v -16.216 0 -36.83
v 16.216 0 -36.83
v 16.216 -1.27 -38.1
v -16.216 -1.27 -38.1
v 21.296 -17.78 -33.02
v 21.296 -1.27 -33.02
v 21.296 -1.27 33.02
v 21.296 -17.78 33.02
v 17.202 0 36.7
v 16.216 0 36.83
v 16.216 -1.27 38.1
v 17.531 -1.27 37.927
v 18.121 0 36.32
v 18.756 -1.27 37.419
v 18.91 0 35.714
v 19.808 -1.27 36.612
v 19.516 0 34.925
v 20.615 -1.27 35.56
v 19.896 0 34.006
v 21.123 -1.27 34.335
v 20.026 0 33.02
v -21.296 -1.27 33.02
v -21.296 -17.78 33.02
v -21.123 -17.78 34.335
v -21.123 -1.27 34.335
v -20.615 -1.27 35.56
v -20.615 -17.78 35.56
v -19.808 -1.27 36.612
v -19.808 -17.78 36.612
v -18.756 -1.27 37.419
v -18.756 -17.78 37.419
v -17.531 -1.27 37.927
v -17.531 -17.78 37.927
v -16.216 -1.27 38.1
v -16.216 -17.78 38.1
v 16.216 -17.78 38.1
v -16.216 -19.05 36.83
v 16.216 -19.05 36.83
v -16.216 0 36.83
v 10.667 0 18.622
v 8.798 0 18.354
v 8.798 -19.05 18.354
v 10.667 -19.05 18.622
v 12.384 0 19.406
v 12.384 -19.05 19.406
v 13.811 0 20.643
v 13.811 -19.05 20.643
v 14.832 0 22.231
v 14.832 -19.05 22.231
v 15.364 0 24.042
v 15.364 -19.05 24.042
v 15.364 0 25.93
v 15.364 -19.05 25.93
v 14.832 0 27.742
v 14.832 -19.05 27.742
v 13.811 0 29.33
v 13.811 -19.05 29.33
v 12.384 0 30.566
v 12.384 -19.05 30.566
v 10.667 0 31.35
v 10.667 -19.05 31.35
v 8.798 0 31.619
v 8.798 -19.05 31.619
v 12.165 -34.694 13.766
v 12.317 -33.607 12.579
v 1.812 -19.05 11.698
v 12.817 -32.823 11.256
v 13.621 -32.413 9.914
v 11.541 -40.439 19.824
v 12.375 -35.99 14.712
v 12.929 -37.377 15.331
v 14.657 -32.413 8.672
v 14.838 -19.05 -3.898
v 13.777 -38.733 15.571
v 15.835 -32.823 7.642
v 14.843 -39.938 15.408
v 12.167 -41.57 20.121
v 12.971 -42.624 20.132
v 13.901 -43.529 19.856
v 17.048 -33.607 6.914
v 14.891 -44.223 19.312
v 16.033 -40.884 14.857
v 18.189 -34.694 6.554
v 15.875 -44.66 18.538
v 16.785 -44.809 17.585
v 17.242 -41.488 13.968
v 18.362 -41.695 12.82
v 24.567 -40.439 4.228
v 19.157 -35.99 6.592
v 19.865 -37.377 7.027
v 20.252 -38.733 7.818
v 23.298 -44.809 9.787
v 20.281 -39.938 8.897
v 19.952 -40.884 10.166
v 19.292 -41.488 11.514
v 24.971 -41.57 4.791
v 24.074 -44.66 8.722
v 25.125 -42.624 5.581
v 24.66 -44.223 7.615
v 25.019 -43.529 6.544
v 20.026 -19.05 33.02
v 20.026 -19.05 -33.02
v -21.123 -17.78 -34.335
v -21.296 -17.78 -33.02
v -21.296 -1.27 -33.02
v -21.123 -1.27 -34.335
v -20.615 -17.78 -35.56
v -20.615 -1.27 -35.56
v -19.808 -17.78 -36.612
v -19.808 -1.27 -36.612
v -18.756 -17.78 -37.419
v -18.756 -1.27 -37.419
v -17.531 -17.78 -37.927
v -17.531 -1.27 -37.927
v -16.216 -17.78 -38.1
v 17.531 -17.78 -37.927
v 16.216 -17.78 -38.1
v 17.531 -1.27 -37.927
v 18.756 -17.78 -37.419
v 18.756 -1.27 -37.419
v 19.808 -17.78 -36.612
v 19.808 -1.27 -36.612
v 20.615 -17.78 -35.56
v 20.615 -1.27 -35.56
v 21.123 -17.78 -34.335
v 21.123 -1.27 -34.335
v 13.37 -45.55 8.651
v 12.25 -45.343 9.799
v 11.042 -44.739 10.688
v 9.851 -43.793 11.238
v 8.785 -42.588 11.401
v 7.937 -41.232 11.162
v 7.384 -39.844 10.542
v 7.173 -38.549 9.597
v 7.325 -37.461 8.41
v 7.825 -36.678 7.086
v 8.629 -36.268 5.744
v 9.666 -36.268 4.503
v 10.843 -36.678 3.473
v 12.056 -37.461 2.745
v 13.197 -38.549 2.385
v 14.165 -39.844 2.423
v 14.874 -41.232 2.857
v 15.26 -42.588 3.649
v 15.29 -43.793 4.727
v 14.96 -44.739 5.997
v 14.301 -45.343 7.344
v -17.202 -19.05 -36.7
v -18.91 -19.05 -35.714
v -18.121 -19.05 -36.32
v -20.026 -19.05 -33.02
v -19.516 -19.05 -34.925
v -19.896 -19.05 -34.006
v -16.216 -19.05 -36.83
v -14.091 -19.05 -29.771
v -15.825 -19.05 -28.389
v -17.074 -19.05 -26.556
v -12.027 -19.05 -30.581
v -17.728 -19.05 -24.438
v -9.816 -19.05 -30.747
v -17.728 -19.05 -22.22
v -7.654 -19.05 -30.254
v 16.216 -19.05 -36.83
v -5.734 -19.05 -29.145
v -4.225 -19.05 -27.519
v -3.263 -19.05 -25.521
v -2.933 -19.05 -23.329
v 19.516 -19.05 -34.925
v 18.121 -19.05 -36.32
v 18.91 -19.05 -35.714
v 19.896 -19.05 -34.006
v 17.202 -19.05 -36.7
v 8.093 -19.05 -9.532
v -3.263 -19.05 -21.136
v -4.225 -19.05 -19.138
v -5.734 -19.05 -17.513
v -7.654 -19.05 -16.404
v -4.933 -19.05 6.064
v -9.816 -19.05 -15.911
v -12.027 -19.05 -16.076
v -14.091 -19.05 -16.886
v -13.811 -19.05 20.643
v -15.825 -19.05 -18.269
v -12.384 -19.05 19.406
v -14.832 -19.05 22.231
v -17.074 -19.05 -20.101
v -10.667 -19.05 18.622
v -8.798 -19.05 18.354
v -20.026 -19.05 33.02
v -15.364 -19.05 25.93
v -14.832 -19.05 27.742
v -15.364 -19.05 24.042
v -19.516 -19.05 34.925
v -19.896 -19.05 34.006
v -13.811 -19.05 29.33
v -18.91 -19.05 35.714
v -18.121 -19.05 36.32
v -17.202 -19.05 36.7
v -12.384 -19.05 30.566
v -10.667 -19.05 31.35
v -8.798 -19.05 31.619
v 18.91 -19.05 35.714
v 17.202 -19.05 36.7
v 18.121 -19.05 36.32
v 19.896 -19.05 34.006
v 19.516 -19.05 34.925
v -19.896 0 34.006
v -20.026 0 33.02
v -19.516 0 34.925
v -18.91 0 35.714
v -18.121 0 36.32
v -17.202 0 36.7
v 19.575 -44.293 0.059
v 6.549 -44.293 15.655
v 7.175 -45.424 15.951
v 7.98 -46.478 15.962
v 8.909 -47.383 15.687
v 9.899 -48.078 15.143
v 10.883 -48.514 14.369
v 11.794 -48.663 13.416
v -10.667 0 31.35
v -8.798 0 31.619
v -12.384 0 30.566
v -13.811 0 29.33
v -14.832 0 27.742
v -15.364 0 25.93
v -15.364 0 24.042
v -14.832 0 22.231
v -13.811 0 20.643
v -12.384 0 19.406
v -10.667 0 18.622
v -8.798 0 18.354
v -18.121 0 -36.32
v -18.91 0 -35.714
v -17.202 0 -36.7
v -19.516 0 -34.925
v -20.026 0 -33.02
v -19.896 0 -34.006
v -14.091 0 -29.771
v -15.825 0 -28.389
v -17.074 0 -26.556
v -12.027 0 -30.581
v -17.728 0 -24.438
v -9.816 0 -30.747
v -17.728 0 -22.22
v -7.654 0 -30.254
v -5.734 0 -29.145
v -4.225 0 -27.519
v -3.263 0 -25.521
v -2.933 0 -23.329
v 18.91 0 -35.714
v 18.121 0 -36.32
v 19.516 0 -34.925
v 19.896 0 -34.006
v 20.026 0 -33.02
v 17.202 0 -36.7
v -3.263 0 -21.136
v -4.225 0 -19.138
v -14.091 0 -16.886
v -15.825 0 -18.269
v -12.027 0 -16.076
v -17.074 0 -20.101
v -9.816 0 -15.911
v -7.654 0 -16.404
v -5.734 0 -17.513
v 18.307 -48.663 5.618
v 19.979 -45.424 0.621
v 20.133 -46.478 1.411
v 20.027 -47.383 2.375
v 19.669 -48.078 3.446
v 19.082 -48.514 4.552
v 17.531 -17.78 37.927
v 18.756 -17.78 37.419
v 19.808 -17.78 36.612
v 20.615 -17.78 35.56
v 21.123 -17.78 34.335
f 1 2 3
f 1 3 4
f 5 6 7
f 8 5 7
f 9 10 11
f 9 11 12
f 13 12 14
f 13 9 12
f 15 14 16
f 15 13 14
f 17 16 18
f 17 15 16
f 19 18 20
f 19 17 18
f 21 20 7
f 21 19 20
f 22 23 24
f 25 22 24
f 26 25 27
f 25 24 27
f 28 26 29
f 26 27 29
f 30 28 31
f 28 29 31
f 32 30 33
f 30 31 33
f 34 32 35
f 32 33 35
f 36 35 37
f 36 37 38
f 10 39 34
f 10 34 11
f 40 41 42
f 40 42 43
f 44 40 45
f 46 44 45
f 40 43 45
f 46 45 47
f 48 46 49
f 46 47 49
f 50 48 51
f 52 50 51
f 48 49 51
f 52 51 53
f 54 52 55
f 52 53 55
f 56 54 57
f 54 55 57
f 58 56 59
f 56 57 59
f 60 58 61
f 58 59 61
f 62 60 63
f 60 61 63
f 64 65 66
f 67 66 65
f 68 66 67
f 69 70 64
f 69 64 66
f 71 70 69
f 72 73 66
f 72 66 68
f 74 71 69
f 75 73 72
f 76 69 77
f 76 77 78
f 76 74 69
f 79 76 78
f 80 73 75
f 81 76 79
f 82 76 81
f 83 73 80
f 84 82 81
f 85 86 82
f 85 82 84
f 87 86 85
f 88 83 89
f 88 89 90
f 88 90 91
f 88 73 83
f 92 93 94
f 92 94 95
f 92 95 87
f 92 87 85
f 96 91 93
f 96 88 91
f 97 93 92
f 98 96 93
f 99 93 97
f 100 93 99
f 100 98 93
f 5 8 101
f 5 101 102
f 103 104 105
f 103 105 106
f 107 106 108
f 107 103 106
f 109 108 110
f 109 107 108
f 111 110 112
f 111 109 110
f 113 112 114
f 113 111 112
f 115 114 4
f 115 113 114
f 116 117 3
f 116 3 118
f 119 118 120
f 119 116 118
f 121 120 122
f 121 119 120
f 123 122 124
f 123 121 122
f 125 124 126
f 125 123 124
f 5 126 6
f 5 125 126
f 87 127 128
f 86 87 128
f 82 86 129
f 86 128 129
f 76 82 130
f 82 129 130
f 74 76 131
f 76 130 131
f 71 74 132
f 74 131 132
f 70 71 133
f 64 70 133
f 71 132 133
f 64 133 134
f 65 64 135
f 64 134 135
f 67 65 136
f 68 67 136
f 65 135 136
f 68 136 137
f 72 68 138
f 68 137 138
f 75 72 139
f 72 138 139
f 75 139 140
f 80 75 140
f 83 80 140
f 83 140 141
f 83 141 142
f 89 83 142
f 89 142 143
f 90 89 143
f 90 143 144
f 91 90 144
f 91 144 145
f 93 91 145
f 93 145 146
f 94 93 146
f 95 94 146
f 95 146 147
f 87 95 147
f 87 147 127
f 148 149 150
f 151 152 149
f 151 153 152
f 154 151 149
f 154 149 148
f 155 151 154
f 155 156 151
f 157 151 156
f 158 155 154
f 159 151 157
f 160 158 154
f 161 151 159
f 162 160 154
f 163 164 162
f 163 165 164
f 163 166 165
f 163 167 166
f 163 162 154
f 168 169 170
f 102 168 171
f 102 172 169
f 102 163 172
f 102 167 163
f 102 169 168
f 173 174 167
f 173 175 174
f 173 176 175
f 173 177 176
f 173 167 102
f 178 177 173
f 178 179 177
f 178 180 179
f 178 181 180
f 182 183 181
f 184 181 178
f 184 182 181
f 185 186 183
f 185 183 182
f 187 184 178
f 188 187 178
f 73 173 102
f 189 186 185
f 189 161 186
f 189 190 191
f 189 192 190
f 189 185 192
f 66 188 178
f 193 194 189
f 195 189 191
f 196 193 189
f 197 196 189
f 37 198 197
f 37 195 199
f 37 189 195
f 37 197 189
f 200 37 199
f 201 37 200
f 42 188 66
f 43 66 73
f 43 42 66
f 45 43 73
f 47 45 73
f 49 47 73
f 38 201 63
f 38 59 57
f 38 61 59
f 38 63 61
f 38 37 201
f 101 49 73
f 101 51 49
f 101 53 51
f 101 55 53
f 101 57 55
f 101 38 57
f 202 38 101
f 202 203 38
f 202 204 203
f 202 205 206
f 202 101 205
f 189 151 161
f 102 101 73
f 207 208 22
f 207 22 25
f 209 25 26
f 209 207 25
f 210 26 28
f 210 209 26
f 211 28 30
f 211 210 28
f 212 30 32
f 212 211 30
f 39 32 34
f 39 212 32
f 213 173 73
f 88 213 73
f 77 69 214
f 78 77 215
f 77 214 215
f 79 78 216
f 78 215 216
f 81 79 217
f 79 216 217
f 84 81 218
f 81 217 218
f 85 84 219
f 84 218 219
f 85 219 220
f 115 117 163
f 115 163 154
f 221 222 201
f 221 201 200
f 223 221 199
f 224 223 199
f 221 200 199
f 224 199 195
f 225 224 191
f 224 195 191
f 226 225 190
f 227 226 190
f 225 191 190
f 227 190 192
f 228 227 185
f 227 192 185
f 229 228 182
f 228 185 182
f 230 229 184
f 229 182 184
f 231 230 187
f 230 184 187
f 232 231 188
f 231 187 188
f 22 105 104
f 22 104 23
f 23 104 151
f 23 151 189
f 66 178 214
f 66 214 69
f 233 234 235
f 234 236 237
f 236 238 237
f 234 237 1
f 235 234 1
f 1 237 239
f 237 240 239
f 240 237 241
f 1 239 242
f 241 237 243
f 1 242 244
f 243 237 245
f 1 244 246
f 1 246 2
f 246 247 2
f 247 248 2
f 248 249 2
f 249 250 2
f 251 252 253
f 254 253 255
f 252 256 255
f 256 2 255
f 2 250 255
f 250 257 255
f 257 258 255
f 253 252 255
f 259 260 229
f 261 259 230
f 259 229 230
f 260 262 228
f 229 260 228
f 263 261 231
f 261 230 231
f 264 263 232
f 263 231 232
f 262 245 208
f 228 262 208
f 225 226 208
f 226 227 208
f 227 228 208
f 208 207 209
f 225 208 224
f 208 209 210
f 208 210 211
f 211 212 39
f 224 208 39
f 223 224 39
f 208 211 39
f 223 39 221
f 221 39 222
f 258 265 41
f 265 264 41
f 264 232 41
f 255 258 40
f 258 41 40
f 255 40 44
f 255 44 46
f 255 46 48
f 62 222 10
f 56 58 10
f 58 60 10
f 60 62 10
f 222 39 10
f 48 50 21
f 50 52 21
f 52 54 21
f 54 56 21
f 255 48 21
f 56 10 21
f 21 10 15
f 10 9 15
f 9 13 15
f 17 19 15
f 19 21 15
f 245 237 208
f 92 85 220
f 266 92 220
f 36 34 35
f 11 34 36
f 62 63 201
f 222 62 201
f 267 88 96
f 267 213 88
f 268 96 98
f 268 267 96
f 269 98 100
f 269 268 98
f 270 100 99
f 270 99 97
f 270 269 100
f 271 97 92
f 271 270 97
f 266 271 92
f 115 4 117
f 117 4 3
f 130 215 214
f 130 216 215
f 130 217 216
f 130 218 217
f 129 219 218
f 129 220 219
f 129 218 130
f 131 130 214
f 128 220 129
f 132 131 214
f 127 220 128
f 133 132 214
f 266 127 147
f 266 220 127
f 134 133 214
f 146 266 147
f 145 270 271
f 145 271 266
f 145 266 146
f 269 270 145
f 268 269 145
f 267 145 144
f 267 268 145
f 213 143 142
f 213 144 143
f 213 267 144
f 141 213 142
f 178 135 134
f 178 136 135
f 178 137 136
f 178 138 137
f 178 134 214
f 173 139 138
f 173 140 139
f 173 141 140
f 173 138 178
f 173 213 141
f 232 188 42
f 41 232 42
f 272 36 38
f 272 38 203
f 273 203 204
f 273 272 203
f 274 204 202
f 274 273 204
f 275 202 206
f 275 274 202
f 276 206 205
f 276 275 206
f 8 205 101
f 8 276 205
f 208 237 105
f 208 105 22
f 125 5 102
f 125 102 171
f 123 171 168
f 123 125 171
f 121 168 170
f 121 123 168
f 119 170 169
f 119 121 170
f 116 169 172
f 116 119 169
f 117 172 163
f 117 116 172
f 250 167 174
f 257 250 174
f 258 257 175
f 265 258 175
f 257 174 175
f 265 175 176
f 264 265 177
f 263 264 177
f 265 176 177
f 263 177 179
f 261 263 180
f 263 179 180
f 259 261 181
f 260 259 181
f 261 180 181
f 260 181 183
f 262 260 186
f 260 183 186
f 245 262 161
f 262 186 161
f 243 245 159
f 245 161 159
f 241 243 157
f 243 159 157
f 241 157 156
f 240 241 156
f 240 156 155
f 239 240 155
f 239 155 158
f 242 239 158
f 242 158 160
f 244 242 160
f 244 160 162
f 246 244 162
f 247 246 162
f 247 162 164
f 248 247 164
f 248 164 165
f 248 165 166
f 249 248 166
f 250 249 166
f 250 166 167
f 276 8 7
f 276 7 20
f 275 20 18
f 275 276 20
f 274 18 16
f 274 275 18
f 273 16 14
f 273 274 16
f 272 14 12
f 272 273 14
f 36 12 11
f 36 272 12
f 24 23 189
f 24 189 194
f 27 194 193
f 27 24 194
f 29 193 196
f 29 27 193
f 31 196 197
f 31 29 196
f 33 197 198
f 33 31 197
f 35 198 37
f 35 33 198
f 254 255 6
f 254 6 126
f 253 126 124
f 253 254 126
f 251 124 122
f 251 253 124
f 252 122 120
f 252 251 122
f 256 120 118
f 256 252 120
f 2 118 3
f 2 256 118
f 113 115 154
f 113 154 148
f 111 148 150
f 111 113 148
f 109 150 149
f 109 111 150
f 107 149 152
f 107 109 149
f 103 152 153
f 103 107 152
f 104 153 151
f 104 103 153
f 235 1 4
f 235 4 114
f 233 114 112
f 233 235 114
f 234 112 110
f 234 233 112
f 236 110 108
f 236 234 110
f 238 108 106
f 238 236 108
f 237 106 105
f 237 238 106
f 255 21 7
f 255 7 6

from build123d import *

# Parameters (mm, degrees)
F0_W      = 42.5921405452
F0_H      = 76.2
F1_DEPTH  = 19.05
F2_R      = 5.08
F3_R      = 7.4390090137
F4_DEPTH  = 25.4
F8_DEPTH  = 10.16
F9_R      = 5.08
F10_R     = 5.4254130452
F11_DEPTH = 25.4
F12_SIZE  = 1.27


with BuildPart() as f1:
    # F0 (on Front) → F1 (new body)
    with BuildSketch(Plane.XZ):
        Rectangle(F0_W, F0_H)
    extrude(amount=F1_DEPTH)

    # F2
    f2_edges = [f1.edges().sort_by_distance(p)[0] for p in [
        (-21.29607, -9.525, 38.1),
        (21.29607, -9.525, 38.1),
        (21.29607, -9.525, -38.1),
        (-21.29607, -9.525, -38.1),
    ]]
    fillet(f2_edges, radius=F2_R)

    # F3 (on face) → F4 (cut)
    with BuildSketch(Plane.XZ.offset(19.05)):
        with Locations((-10.371832177, -23.3288127929)):
            Circle(F3_R)
        with BuildLine():
            Line((8.7983496487, 31.6190682352), (-8.7983496487, 31.6190682352))
            ThreePointArc((-8.7983496487, 31.6190682352), (-15.4311150855, 24.9863027984), (-8.7983496487, 18.3535373615))
            Line((-8.7983496487, 18.3535373615), (8.7983496487, 18.3535373615))
            ThreePointArc((8.7983496487, 18.3535373615), (15.4311150855, 24.9863027984), (8.7983496487, 31.6190682352))
        make_face()
    extrude(amount=-F4_DEPTH, mode=Mode.SUBTRACT)

    # F7 (on face) → F8 (join, symmetric)
    with BuildSketch(Plane(origin=(1.5022693661, 0, -1.79863414), x_dir=(0.7675056841, 0, 0.6410421397), z_dir=(0.6410421397, 0, -0.7675056841))):
        Polygon((0.1007605708, 19.05), (8.8891370815, 19.05), (24.1558142006, 44.8086634278), (17.6520292383, 48.6633348998), align=None)
    extrude(amount=F8_DEPTH, both=True)

    # F9
    f9_edges = [f1.edges().sort_by_distance(p)[0] for p in [
        (11.03316, -46.735999, 19.399518),
        (24.059136, -46.735999, 3.803803),
    ]]
    fillet(f9_edges, radius=F9_R)

    # F10 (on face) → F11 (cut)
    with BuildSketch(Plane(origin=(-6.3556814341, -4.907967933, -5.3084422822), x_dir=(0.3913195596, -0.860258078, 0.3268410032), z_dir=(-0.6602529647, -0.5098588424, -0.551461679))):
        with Locations((41.8185740709, -1.9313164521)):
            Circle(F10_R)
    extrude(amount=-F11_DEPTH, mode=Mode.SUBTRACT)

    # F12
    f12_edges = [f1.edges().sort_by_distance(p)[0] for p in [
        (-21.29607, -19.05, 0),
        (-21.29607, 0, 0),
    ]]
    chamfer(f12_edges, length=F12_SIZE)


solid = f1.part
